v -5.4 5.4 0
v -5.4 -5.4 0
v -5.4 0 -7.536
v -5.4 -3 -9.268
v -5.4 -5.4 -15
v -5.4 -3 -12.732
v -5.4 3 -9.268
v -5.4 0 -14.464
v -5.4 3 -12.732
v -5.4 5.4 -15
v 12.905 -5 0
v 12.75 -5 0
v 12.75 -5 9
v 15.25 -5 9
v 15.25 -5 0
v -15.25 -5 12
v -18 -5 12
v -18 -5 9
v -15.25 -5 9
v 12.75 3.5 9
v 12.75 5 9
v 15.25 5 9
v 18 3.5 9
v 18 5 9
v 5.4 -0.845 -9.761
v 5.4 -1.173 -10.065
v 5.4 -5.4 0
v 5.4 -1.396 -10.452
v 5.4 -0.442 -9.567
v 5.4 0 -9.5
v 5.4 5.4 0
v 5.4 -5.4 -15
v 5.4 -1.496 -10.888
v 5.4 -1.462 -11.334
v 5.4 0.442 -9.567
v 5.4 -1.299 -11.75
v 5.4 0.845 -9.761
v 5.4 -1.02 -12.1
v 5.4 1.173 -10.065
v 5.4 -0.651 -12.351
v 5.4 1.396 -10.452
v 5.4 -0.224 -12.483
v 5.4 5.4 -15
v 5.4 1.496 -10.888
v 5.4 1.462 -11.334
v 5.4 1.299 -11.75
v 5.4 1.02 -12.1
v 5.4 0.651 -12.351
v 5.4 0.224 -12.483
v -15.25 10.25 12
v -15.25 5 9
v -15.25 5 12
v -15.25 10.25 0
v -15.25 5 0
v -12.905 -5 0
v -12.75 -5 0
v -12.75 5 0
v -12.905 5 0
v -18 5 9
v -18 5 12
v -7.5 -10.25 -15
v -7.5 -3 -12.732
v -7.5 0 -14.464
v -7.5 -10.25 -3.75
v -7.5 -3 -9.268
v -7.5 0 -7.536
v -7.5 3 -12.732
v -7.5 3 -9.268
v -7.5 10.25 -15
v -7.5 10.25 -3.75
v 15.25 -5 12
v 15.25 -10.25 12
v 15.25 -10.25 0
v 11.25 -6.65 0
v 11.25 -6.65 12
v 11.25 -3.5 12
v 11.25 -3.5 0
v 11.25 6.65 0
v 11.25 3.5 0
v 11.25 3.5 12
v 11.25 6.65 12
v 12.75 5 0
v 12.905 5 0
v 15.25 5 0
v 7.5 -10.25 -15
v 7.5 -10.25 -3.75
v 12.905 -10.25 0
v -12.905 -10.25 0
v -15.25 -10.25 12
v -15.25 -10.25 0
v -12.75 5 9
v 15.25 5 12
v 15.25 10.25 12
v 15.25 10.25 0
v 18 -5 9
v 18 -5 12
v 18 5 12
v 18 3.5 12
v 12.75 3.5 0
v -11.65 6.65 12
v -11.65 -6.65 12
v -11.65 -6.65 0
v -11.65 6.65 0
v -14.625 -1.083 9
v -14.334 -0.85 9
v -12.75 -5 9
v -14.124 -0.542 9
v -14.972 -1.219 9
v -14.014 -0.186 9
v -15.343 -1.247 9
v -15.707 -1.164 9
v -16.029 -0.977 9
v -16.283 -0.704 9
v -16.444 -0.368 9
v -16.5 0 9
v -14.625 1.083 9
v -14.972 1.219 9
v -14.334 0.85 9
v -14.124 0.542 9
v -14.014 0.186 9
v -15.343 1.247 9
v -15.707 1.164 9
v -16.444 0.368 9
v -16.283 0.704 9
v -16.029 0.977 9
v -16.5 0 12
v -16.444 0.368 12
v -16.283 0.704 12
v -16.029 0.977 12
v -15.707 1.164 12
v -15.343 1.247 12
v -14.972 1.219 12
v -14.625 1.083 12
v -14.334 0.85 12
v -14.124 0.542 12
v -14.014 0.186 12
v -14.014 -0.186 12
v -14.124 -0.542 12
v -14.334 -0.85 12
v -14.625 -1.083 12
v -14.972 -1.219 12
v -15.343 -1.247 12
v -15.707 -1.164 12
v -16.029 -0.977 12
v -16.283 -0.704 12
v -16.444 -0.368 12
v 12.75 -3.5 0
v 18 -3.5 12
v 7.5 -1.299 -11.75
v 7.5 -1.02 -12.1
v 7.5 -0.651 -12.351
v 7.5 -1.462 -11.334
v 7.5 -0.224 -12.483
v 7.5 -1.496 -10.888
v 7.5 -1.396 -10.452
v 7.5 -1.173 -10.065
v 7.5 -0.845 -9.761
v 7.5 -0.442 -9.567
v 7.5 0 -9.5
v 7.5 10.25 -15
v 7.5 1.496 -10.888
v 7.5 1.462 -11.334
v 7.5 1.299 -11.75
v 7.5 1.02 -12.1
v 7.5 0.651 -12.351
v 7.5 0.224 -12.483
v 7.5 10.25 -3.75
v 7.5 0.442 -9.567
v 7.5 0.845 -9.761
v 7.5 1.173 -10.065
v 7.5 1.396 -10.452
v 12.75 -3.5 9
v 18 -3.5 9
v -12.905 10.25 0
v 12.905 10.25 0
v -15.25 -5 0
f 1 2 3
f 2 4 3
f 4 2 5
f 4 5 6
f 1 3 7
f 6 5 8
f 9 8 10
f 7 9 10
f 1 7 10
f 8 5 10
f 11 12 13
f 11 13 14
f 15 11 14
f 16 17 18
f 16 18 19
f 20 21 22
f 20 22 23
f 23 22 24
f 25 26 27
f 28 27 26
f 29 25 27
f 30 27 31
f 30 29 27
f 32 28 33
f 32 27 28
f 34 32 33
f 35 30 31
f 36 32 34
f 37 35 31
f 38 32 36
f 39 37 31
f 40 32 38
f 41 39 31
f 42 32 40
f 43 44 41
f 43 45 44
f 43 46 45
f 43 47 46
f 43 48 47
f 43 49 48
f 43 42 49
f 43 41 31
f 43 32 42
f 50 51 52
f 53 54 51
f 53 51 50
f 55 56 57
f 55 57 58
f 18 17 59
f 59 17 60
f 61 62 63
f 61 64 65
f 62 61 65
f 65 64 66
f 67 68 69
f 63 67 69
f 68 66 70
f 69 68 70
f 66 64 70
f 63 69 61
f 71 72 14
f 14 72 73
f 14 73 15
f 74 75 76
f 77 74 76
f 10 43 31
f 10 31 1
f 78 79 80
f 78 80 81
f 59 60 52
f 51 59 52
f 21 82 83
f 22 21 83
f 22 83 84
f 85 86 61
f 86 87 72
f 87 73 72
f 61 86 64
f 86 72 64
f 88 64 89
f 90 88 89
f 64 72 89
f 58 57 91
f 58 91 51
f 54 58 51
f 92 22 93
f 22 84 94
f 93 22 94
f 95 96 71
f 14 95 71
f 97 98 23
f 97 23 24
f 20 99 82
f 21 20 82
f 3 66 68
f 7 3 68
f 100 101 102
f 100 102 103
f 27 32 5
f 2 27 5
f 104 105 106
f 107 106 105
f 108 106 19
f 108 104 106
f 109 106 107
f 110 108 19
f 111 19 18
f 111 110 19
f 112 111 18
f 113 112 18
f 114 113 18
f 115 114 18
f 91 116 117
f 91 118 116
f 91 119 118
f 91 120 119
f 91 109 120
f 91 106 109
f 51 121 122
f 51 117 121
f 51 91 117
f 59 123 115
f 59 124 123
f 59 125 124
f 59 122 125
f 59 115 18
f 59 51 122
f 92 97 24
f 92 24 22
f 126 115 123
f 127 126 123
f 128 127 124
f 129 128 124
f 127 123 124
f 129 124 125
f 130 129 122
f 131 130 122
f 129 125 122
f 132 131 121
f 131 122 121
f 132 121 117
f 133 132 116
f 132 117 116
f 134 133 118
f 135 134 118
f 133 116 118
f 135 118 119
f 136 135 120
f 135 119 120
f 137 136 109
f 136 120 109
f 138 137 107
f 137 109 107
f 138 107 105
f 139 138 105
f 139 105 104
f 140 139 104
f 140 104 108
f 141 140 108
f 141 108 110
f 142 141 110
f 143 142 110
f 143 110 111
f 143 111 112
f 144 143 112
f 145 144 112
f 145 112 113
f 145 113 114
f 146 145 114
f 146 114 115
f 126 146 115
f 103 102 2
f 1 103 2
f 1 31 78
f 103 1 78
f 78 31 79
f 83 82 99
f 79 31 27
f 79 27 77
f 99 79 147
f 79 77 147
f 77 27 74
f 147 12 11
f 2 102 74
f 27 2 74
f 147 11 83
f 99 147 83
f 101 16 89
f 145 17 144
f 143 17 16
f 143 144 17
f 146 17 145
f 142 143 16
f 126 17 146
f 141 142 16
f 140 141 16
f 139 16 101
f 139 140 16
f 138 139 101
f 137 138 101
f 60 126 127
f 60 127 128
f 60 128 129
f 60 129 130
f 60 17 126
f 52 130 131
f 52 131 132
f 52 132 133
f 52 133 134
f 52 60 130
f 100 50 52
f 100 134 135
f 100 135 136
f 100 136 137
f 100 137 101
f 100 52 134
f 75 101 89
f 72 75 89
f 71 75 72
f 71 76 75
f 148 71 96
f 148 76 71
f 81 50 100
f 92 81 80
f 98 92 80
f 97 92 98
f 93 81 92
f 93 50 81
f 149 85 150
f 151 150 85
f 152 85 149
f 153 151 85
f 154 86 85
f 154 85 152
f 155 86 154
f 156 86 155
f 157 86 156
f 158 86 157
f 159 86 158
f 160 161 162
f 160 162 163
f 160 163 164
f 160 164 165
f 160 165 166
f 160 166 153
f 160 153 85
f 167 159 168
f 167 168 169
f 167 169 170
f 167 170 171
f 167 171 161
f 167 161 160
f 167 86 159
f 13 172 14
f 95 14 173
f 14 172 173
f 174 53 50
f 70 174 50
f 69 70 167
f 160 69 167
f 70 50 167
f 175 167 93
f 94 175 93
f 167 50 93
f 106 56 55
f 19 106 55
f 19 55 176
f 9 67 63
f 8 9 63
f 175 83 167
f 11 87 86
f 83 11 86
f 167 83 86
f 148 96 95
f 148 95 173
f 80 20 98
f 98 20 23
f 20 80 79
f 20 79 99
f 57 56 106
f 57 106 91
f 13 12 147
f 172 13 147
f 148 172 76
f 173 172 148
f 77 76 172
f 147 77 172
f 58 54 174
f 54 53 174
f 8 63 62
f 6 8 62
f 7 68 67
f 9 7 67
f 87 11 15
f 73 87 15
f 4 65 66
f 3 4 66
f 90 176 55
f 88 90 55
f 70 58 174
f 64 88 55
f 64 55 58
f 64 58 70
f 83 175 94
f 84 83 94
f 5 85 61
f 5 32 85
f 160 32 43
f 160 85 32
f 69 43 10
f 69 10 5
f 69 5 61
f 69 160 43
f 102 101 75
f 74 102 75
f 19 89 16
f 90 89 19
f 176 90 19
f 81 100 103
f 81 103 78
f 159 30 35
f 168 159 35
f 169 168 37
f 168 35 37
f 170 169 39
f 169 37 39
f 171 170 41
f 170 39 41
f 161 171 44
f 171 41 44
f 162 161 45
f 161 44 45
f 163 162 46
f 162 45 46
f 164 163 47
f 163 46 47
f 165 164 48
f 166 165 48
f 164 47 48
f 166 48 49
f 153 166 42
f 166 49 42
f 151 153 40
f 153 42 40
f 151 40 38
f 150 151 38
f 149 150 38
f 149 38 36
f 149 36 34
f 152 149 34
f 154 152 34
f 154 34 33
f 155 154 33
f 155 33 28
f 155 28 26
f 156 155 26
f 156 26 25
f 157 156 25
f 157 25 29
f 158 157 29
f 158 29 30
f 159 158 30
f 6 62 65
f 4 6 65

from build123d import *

# Parameters (mm, degrees)
SKETCH_2_W           = 30.5
SKETCH_2_H           = 20.5
SKETCH_2_W_2         = 22.5
SKETCH_2_H_2         = 12.5
EXTRUDE_1_DEPTH      = 12
SKETCH_3_W           = 2.75
SKETCH_3_H           = 10
EXTRUDE_2_DEPTH      = 3
SKETCH_4_W           = 4.940698383
SKETCH_4_H           = 10
CUT_EXTRUDE_1_DEPTH  = 9
SKETCH_7_R           = 1.25
CUT_EXTRUDE_2_DEPTH  = 23.584563312
SKETCH_12_W          = 15
SKETCH_12_H          = 20.5
EXTRUDE_5_DEPTH      = 15
SKETCH_13_W          = 10
SKETCH_13_H          = 10
CUT_EXTRUDE_6_DEPTH  = 12
EXTRUDE_7_REACH      = 33.133
SKETCH_15_R          = 1.5
CUT_EXTRUDE_7_DEPTH  = 32.30994251
SKETCH_16_W          = 10.43035396
SKETCH_16_H          = 7
CUT_EXTRUDE_8_DEPTH  = 23
CUT_EXTRUDE_9_REACH  = 36.03
SKETCH_17_W          = 10.8
SKETCH_17_H          = 10.8
CUT_EXTRUDE_10_REACH = 33.31
SKETCH_19_W          = 22.9
SKETCH_19_H          = 13.3
CUT_EXTRUDE_12_DEPTH = 12


with BuildPart() as part:
    # 草图2 → 凸台-拉伸1 (new body)
    with BuildSketch(Plane.XY):
        Rectangle(SKETCH_2_W, SKETCH_2_H)
        Rectangle(SKETCH_2_W_2, SKETCH_2_H_2, mode=Mode.SUBTRACT)
    extrude(amount=EXTRUDE_1_DEPTH)

    # 草图3 → 凸台-拉伸2 (add)
    with BuildSketch(Plane.XY.offset(12)):
        with Locations((-16.625, 0)):
            Rectangle(SKETCH_3_W, SKETCH_3_H)
    extrude_2 = extrude(amount=-EXTRUDE_2_DEPTH)

    # 镜向1: 凸台-拉伸2 across plane
    add(extrude_2.mirror(Plane(origin=(0, 0, 0), x_dir=(0, 0, 1), z_dir=(1, 0, 0))))

    # 草图4 → 切除-拉伸1 (cut)
    with BuildSketch(Plane(origin=(0, 0, 0), x_dir=(-1, 0, 0), z_dir=(0, 0, -1))):
        with Locations((15.220349192, 0)):
            Rectangle(SKETCH_4_W, SKETCH_4_H)
    cut_extrude_1 = extrude(amount=-CUT_EXTRUDE_1_DEPTH, mode=Mode.SUBTRACT)

    # 镜向2: 切除-拉伸1 across plane
    add(cut_extrude_1.mirror(Plane(origin=(0, 0, 0), x_dir=(0, 0, 1), z_dir=(1, 0, 0))), mode=Mode.SUBTRACT)

    # 草图7 → 切除-拉伸2 (cut, through all)
    with BuildSketch(Plane(origin=(0, 0, 9), x_dir=(-1, 0, 0), z_dir=(0, 0, -1))):
        with Locations((15.25, 0)):
            Circle(SKETCH_7_R)
    extrude(amount=-CUT_EXTRUDE_2_DEPTH, mode=Mode.SUBTRACT)

    # 草图12 → 凸台-拉伸5 (add)
    with BuildSketch(Plane(origin=(0, 0, 0), x_dir=(-1, 0, 0), z_dir=(0, 0, -1))):
        Rectangle(SKETCH_12_W, SKETCH_12_H)
    extrude(amount=EXTRUDE_5_DEPTH)

    # 草图13 → 切除-拉伸6 (cut)
    with BuildSketch(Plane(origin=(0, 0, -15), x_dir=(-1, 0, 0), z_dir=(0, 0, -1))):
        Rectangle(SKETCH_13_W, SKETCH_13_H)
    extrude(amount=-CUT_EXTRUDE_6_DEPTH, mode=Mode.SUBTRACT)

    # 凸台-拉伸7: up to this face of the body (flat: up to its plane)
    extrude_7_end = Plane(part.part.faces().sort_by_distance((0, 10.25, 0.860406091))[0])
    # 草图14 → 凸台-拉伸7 (add, up to the picked face)
    with BuildSketch(Plane.XZ.offset(10.25), mode=Mode.PRIVATE) as extrude_7_sk1:
        Polygon((-7.5, -3.75), (-7.5, 0), (-12.905079067, 0), align=None)
    extrude_7_tool1 = split(extrude(extrude_7_sk1.sketch, amount=-EXTRUDE_7_REACH, mode=Mode.PRIVATE), bisect_by=extrude_7_end, keep=Keep.BOTH, mode=Mode.PRIVATE)
    extrude_7 = extrude_7_tool1.solids().sort_by(Axis((-9.301693, -10.25, -1.25), (0, 1, 0)))[0]
    add(extrude_7)

    # 镜向6: 凸台-拉伸7 across plane
    add(extrude_7.mirror(Plane(origin=(0, 0, 0), x_dir=(0, 0, 1), z_dir=(1, 0, 0))))

    # 草图15 → 切除-拉伸7 (cut, through all)
    with BuildSketch(Plane.ZY.offset(7.5)):
        with Locations((-11, 0)):
            Circle(SKETCH_15_R)
    extrude(amount=-CUT_EXTRUDE_7_DEPTH, mode=Mode.SUBTRACT)

    # 草图16 → 切除-拉伸8 (cut)
    with BuildSketch(Plane.XY):
        with Locations((16.46517698, 0)):
            Rectangle(SKETCH_16_W, SKETCH_16_H)
    extrude(amount=CUT_EXTRUDE_8_DEPTH, mode=Mode.SUBTRACT)

    # 草图17 → 切除-拉伸9 (cut, up to next)
    with BuildSketch(Plane(origin=(0, 0, -15), x_dir=(-1, 0, 0), z_dir=(0, 0, -1)), mode=Mode.PRIVATE) as cut_extrude_9_sk1:
        Rectangle(SKETCH_17_W, SKETCH_17_H)
    cut_extrude_9_tool1 = extrude(cut_extrude_9_sk1.sketch, amount=-CUT_EXTRUDE_9_REACH, mode=Mode.PRIVATE) & part.part
    add(cut_extrude_9_tool1.solids().sort_by_distance((0, 0, -15))[0], mode=Mode.SUBTRACT)

    # 草图18 → 切除-拉伸10 (cut, up to next)
    with BuildSketch(Plane.ZY.offset(7.5), mode=Mode.PRIVATE) as cut_extrude_10_sk1:
        Polygon((-9.267949192, 3), (-12.732050808, 3), (-14.464101615, 0), (-12.732050808, -3), (-9.267949192, -3), (-7.535898385, 0), align=None)
    cut_extrude_10_tool1 = extrude(cut_extrude_10_sk1.sketch, amount=-CUT_EXTRUDE_10_REACH, mode=Mode.PRIVATE) & part.part
    add(cut_extrude_10_tool1.solids().sort_by_distance((-7.5, 0, -11))[0], mode=Mode.SUBTRACT)

    # 草图19 → 切除-拉伸12 (cut)
    with BuildSketch(Plane.XY.offset(12)):
        with Locations((-0.2, 0)):
            Rectangle(SKETCH_19_W, SKETCH_19_H)
    extrude(amount=-CUT_EXTRUDE_12_DEPTH, mode=Mode.SUBTRACT)


solid = part.part
